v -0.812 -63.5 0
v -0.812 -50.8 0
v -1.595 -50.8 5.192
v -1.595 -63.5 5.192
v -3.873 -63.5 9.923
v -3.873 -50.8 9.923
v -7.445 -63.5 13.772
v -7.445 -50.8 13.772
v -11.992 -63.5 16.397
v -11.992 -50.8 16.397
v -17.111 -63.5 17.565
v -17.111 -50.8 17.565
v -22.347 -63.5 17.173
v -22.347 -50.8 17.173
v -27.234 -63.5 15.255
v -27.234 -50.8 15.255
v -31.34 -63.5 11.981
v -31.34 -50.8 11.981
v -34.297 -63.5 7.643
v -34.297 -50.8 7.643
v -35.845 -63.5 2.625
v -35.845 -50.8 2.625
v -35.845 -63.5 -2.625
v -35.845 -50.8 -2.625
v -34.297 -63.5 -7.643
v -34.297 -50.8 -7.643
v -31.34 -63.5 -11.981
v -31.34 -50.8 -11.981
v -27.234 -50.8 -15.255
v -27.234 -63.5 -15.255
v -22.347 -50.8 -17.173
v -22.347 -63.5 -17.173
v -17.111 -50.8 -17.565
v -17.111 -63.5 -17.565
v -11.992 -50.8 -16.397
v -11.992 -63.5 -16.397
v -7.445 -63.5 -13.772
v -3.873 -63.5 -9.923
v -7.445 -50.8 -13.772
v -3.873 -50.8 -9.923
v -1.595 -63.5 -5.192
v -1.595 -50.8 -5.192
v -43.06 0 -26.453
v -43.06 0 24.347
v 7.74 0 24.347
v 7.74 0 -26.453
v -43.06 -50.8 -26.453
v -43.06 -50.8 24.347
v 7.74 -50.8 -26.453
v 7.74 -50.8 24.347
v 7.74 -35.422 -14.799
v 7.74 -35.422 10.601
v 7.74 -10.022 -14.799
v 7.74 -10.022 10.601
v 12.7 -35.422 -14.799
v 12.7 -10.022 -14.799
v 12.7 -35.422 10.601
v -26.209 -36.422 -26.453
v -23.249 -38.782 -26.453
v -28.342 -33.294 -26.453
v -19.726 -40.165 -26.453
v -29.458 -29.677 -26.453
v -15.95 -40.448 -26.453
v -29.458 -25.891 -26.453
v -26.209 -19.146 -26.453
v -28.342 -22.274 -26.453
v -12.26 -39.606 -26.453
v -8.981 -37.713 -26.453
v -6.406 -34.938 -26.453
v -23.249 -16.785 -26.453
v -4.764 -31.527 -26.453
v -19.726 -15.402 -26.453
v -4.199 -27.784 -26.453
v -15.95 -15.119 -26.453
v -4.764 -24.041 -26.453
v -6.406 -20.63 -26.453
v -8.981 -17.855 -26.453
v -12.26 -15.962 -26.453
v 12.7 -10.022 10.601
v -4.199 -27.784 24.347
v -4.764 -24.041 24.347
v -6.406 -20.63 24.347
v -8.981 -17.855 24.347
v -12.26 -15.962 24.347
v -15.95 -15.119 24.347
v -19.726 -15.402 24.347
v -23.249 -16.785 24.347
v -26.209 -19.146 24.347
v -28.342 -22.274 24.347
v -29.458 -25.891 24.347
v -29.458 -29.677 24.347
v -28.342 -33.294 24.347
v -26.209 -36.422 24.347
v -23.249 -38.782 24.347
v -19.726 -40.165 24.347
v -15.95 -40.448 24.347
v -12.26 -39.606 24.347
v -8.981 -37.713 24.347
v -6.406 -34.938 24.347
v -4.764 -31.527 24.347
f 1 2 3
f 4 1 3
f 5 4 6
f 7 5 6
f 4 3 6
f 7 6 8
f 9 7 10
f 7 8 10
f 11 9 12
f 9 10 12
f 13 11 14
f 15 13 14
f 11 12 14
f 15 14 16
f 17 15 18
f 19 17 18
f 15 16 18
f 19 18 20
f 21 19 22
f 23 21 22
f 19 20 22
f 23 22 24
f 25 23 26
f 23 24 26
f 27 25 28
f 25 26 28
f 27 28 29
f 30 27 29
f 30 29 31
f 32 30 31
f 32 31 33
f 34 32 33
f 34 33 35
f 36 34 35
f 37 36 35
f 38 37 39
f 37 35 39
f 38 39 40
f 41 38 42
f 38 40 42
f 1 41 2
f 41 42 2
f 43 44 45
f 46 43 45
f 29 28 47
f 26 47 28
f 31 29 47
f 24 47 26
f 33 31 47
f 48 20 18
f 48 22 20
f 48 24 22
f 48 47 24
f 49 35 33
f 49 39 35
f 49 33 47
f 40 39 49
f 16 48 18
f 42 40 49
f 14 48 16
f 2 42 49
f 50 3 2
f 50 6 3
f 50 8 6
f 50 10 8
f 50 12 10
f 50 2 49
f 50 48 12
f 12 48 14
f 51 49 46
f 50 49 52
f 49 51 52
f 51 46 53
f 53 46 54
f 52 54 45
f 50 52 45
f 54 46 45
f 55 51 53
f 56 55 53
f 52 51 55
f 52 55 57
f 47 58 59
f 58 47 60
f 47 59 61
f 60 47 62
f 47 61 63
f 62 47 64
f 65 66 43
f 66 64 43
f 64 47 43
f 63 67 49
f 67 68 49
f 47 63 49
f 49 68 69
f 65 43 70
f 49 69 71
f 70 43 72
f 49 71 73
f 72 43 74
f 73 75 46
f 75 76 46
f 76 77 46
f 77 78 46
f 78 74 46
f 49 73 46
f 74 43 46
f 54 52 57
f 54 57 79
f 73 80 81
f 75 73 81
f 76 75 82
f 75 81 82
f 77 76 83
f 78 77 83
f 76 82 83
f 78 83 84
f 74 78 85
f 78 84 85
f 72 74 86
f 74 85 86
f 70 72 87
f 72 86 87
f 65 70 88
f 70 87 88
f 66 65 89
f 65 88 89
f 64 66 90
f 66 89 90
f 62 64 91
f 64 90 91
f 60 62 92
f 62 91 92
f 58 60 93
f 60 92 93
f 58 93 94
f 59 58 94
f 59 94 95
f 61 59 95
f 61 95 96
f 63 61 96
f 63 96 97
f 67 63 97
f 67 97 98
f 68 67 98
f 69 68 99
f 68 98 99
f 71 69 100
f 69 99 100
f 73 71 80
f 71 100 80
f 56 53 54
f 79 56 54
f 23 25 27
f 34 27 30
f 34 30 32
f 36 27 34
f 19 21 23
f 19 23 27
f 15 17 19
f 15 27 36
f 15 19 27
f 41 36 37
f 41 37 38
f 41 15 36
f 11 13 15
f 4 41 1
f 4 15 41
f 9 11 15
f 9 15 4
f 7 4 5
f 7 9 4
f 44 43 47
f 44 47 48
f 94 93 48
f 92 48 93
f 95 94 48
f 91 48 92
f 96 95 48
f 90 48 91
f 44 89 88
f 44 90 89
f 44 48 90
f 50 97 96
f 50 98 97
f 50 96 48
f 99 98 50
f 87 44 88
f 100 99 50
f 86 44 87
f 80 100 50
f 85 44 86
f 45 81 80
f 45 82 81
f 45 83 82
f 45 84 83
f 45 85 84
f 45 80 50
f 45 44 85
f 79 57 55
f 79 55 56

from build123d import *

# Parameters (mm, degrees)
F0_W     = 50.8
F0_H     = 50.8
F1_DEPTH = 50.8
F2_R     = 12.7
F3_DEPTH = 50.8
F4_W     = 25.4
F4_H     = 25.4
F5_DEPTH = 12.7
F6_R     = 17.614726
F7_DEPTH = 12.7


with BuildPart() as f1:
    # F0 (on Front) → F1 (new body)
    with BuildSketch(Plane.XZ):
        with Locations((-17.660277, -1.05328)):
            Rectangle(F0_W, F0_H)
    extrude(amount=F1_DEPTH)

    # F2 (on face) → F3 (cut)
    with BuildSketch(Plane.XY.offset(24.34672)):
        with Locations((-16.899487, -27.783902)):
            Circle(F2_R)
    extrude(amount=-F3_DEPTH, mode=Mode.SUBTRACT)

    # F4 (on Right) → F5 (join)
    with BuildSketch(Plane.YZ):
        with Locations((-22.722087, -2.098986)):
            Rectangle(F4_W, F4_H)
    extrude(amount=F5_DEPTH)

    # F6 (on face) → F7 (join)
    with BuildSketch(Plane.XZ.offset(50.8)):
        with Locations((-18.427124, 0)):
            Circle(F6_R)
    extrude(amount=F7_DEPTH)


solid = f1.part
